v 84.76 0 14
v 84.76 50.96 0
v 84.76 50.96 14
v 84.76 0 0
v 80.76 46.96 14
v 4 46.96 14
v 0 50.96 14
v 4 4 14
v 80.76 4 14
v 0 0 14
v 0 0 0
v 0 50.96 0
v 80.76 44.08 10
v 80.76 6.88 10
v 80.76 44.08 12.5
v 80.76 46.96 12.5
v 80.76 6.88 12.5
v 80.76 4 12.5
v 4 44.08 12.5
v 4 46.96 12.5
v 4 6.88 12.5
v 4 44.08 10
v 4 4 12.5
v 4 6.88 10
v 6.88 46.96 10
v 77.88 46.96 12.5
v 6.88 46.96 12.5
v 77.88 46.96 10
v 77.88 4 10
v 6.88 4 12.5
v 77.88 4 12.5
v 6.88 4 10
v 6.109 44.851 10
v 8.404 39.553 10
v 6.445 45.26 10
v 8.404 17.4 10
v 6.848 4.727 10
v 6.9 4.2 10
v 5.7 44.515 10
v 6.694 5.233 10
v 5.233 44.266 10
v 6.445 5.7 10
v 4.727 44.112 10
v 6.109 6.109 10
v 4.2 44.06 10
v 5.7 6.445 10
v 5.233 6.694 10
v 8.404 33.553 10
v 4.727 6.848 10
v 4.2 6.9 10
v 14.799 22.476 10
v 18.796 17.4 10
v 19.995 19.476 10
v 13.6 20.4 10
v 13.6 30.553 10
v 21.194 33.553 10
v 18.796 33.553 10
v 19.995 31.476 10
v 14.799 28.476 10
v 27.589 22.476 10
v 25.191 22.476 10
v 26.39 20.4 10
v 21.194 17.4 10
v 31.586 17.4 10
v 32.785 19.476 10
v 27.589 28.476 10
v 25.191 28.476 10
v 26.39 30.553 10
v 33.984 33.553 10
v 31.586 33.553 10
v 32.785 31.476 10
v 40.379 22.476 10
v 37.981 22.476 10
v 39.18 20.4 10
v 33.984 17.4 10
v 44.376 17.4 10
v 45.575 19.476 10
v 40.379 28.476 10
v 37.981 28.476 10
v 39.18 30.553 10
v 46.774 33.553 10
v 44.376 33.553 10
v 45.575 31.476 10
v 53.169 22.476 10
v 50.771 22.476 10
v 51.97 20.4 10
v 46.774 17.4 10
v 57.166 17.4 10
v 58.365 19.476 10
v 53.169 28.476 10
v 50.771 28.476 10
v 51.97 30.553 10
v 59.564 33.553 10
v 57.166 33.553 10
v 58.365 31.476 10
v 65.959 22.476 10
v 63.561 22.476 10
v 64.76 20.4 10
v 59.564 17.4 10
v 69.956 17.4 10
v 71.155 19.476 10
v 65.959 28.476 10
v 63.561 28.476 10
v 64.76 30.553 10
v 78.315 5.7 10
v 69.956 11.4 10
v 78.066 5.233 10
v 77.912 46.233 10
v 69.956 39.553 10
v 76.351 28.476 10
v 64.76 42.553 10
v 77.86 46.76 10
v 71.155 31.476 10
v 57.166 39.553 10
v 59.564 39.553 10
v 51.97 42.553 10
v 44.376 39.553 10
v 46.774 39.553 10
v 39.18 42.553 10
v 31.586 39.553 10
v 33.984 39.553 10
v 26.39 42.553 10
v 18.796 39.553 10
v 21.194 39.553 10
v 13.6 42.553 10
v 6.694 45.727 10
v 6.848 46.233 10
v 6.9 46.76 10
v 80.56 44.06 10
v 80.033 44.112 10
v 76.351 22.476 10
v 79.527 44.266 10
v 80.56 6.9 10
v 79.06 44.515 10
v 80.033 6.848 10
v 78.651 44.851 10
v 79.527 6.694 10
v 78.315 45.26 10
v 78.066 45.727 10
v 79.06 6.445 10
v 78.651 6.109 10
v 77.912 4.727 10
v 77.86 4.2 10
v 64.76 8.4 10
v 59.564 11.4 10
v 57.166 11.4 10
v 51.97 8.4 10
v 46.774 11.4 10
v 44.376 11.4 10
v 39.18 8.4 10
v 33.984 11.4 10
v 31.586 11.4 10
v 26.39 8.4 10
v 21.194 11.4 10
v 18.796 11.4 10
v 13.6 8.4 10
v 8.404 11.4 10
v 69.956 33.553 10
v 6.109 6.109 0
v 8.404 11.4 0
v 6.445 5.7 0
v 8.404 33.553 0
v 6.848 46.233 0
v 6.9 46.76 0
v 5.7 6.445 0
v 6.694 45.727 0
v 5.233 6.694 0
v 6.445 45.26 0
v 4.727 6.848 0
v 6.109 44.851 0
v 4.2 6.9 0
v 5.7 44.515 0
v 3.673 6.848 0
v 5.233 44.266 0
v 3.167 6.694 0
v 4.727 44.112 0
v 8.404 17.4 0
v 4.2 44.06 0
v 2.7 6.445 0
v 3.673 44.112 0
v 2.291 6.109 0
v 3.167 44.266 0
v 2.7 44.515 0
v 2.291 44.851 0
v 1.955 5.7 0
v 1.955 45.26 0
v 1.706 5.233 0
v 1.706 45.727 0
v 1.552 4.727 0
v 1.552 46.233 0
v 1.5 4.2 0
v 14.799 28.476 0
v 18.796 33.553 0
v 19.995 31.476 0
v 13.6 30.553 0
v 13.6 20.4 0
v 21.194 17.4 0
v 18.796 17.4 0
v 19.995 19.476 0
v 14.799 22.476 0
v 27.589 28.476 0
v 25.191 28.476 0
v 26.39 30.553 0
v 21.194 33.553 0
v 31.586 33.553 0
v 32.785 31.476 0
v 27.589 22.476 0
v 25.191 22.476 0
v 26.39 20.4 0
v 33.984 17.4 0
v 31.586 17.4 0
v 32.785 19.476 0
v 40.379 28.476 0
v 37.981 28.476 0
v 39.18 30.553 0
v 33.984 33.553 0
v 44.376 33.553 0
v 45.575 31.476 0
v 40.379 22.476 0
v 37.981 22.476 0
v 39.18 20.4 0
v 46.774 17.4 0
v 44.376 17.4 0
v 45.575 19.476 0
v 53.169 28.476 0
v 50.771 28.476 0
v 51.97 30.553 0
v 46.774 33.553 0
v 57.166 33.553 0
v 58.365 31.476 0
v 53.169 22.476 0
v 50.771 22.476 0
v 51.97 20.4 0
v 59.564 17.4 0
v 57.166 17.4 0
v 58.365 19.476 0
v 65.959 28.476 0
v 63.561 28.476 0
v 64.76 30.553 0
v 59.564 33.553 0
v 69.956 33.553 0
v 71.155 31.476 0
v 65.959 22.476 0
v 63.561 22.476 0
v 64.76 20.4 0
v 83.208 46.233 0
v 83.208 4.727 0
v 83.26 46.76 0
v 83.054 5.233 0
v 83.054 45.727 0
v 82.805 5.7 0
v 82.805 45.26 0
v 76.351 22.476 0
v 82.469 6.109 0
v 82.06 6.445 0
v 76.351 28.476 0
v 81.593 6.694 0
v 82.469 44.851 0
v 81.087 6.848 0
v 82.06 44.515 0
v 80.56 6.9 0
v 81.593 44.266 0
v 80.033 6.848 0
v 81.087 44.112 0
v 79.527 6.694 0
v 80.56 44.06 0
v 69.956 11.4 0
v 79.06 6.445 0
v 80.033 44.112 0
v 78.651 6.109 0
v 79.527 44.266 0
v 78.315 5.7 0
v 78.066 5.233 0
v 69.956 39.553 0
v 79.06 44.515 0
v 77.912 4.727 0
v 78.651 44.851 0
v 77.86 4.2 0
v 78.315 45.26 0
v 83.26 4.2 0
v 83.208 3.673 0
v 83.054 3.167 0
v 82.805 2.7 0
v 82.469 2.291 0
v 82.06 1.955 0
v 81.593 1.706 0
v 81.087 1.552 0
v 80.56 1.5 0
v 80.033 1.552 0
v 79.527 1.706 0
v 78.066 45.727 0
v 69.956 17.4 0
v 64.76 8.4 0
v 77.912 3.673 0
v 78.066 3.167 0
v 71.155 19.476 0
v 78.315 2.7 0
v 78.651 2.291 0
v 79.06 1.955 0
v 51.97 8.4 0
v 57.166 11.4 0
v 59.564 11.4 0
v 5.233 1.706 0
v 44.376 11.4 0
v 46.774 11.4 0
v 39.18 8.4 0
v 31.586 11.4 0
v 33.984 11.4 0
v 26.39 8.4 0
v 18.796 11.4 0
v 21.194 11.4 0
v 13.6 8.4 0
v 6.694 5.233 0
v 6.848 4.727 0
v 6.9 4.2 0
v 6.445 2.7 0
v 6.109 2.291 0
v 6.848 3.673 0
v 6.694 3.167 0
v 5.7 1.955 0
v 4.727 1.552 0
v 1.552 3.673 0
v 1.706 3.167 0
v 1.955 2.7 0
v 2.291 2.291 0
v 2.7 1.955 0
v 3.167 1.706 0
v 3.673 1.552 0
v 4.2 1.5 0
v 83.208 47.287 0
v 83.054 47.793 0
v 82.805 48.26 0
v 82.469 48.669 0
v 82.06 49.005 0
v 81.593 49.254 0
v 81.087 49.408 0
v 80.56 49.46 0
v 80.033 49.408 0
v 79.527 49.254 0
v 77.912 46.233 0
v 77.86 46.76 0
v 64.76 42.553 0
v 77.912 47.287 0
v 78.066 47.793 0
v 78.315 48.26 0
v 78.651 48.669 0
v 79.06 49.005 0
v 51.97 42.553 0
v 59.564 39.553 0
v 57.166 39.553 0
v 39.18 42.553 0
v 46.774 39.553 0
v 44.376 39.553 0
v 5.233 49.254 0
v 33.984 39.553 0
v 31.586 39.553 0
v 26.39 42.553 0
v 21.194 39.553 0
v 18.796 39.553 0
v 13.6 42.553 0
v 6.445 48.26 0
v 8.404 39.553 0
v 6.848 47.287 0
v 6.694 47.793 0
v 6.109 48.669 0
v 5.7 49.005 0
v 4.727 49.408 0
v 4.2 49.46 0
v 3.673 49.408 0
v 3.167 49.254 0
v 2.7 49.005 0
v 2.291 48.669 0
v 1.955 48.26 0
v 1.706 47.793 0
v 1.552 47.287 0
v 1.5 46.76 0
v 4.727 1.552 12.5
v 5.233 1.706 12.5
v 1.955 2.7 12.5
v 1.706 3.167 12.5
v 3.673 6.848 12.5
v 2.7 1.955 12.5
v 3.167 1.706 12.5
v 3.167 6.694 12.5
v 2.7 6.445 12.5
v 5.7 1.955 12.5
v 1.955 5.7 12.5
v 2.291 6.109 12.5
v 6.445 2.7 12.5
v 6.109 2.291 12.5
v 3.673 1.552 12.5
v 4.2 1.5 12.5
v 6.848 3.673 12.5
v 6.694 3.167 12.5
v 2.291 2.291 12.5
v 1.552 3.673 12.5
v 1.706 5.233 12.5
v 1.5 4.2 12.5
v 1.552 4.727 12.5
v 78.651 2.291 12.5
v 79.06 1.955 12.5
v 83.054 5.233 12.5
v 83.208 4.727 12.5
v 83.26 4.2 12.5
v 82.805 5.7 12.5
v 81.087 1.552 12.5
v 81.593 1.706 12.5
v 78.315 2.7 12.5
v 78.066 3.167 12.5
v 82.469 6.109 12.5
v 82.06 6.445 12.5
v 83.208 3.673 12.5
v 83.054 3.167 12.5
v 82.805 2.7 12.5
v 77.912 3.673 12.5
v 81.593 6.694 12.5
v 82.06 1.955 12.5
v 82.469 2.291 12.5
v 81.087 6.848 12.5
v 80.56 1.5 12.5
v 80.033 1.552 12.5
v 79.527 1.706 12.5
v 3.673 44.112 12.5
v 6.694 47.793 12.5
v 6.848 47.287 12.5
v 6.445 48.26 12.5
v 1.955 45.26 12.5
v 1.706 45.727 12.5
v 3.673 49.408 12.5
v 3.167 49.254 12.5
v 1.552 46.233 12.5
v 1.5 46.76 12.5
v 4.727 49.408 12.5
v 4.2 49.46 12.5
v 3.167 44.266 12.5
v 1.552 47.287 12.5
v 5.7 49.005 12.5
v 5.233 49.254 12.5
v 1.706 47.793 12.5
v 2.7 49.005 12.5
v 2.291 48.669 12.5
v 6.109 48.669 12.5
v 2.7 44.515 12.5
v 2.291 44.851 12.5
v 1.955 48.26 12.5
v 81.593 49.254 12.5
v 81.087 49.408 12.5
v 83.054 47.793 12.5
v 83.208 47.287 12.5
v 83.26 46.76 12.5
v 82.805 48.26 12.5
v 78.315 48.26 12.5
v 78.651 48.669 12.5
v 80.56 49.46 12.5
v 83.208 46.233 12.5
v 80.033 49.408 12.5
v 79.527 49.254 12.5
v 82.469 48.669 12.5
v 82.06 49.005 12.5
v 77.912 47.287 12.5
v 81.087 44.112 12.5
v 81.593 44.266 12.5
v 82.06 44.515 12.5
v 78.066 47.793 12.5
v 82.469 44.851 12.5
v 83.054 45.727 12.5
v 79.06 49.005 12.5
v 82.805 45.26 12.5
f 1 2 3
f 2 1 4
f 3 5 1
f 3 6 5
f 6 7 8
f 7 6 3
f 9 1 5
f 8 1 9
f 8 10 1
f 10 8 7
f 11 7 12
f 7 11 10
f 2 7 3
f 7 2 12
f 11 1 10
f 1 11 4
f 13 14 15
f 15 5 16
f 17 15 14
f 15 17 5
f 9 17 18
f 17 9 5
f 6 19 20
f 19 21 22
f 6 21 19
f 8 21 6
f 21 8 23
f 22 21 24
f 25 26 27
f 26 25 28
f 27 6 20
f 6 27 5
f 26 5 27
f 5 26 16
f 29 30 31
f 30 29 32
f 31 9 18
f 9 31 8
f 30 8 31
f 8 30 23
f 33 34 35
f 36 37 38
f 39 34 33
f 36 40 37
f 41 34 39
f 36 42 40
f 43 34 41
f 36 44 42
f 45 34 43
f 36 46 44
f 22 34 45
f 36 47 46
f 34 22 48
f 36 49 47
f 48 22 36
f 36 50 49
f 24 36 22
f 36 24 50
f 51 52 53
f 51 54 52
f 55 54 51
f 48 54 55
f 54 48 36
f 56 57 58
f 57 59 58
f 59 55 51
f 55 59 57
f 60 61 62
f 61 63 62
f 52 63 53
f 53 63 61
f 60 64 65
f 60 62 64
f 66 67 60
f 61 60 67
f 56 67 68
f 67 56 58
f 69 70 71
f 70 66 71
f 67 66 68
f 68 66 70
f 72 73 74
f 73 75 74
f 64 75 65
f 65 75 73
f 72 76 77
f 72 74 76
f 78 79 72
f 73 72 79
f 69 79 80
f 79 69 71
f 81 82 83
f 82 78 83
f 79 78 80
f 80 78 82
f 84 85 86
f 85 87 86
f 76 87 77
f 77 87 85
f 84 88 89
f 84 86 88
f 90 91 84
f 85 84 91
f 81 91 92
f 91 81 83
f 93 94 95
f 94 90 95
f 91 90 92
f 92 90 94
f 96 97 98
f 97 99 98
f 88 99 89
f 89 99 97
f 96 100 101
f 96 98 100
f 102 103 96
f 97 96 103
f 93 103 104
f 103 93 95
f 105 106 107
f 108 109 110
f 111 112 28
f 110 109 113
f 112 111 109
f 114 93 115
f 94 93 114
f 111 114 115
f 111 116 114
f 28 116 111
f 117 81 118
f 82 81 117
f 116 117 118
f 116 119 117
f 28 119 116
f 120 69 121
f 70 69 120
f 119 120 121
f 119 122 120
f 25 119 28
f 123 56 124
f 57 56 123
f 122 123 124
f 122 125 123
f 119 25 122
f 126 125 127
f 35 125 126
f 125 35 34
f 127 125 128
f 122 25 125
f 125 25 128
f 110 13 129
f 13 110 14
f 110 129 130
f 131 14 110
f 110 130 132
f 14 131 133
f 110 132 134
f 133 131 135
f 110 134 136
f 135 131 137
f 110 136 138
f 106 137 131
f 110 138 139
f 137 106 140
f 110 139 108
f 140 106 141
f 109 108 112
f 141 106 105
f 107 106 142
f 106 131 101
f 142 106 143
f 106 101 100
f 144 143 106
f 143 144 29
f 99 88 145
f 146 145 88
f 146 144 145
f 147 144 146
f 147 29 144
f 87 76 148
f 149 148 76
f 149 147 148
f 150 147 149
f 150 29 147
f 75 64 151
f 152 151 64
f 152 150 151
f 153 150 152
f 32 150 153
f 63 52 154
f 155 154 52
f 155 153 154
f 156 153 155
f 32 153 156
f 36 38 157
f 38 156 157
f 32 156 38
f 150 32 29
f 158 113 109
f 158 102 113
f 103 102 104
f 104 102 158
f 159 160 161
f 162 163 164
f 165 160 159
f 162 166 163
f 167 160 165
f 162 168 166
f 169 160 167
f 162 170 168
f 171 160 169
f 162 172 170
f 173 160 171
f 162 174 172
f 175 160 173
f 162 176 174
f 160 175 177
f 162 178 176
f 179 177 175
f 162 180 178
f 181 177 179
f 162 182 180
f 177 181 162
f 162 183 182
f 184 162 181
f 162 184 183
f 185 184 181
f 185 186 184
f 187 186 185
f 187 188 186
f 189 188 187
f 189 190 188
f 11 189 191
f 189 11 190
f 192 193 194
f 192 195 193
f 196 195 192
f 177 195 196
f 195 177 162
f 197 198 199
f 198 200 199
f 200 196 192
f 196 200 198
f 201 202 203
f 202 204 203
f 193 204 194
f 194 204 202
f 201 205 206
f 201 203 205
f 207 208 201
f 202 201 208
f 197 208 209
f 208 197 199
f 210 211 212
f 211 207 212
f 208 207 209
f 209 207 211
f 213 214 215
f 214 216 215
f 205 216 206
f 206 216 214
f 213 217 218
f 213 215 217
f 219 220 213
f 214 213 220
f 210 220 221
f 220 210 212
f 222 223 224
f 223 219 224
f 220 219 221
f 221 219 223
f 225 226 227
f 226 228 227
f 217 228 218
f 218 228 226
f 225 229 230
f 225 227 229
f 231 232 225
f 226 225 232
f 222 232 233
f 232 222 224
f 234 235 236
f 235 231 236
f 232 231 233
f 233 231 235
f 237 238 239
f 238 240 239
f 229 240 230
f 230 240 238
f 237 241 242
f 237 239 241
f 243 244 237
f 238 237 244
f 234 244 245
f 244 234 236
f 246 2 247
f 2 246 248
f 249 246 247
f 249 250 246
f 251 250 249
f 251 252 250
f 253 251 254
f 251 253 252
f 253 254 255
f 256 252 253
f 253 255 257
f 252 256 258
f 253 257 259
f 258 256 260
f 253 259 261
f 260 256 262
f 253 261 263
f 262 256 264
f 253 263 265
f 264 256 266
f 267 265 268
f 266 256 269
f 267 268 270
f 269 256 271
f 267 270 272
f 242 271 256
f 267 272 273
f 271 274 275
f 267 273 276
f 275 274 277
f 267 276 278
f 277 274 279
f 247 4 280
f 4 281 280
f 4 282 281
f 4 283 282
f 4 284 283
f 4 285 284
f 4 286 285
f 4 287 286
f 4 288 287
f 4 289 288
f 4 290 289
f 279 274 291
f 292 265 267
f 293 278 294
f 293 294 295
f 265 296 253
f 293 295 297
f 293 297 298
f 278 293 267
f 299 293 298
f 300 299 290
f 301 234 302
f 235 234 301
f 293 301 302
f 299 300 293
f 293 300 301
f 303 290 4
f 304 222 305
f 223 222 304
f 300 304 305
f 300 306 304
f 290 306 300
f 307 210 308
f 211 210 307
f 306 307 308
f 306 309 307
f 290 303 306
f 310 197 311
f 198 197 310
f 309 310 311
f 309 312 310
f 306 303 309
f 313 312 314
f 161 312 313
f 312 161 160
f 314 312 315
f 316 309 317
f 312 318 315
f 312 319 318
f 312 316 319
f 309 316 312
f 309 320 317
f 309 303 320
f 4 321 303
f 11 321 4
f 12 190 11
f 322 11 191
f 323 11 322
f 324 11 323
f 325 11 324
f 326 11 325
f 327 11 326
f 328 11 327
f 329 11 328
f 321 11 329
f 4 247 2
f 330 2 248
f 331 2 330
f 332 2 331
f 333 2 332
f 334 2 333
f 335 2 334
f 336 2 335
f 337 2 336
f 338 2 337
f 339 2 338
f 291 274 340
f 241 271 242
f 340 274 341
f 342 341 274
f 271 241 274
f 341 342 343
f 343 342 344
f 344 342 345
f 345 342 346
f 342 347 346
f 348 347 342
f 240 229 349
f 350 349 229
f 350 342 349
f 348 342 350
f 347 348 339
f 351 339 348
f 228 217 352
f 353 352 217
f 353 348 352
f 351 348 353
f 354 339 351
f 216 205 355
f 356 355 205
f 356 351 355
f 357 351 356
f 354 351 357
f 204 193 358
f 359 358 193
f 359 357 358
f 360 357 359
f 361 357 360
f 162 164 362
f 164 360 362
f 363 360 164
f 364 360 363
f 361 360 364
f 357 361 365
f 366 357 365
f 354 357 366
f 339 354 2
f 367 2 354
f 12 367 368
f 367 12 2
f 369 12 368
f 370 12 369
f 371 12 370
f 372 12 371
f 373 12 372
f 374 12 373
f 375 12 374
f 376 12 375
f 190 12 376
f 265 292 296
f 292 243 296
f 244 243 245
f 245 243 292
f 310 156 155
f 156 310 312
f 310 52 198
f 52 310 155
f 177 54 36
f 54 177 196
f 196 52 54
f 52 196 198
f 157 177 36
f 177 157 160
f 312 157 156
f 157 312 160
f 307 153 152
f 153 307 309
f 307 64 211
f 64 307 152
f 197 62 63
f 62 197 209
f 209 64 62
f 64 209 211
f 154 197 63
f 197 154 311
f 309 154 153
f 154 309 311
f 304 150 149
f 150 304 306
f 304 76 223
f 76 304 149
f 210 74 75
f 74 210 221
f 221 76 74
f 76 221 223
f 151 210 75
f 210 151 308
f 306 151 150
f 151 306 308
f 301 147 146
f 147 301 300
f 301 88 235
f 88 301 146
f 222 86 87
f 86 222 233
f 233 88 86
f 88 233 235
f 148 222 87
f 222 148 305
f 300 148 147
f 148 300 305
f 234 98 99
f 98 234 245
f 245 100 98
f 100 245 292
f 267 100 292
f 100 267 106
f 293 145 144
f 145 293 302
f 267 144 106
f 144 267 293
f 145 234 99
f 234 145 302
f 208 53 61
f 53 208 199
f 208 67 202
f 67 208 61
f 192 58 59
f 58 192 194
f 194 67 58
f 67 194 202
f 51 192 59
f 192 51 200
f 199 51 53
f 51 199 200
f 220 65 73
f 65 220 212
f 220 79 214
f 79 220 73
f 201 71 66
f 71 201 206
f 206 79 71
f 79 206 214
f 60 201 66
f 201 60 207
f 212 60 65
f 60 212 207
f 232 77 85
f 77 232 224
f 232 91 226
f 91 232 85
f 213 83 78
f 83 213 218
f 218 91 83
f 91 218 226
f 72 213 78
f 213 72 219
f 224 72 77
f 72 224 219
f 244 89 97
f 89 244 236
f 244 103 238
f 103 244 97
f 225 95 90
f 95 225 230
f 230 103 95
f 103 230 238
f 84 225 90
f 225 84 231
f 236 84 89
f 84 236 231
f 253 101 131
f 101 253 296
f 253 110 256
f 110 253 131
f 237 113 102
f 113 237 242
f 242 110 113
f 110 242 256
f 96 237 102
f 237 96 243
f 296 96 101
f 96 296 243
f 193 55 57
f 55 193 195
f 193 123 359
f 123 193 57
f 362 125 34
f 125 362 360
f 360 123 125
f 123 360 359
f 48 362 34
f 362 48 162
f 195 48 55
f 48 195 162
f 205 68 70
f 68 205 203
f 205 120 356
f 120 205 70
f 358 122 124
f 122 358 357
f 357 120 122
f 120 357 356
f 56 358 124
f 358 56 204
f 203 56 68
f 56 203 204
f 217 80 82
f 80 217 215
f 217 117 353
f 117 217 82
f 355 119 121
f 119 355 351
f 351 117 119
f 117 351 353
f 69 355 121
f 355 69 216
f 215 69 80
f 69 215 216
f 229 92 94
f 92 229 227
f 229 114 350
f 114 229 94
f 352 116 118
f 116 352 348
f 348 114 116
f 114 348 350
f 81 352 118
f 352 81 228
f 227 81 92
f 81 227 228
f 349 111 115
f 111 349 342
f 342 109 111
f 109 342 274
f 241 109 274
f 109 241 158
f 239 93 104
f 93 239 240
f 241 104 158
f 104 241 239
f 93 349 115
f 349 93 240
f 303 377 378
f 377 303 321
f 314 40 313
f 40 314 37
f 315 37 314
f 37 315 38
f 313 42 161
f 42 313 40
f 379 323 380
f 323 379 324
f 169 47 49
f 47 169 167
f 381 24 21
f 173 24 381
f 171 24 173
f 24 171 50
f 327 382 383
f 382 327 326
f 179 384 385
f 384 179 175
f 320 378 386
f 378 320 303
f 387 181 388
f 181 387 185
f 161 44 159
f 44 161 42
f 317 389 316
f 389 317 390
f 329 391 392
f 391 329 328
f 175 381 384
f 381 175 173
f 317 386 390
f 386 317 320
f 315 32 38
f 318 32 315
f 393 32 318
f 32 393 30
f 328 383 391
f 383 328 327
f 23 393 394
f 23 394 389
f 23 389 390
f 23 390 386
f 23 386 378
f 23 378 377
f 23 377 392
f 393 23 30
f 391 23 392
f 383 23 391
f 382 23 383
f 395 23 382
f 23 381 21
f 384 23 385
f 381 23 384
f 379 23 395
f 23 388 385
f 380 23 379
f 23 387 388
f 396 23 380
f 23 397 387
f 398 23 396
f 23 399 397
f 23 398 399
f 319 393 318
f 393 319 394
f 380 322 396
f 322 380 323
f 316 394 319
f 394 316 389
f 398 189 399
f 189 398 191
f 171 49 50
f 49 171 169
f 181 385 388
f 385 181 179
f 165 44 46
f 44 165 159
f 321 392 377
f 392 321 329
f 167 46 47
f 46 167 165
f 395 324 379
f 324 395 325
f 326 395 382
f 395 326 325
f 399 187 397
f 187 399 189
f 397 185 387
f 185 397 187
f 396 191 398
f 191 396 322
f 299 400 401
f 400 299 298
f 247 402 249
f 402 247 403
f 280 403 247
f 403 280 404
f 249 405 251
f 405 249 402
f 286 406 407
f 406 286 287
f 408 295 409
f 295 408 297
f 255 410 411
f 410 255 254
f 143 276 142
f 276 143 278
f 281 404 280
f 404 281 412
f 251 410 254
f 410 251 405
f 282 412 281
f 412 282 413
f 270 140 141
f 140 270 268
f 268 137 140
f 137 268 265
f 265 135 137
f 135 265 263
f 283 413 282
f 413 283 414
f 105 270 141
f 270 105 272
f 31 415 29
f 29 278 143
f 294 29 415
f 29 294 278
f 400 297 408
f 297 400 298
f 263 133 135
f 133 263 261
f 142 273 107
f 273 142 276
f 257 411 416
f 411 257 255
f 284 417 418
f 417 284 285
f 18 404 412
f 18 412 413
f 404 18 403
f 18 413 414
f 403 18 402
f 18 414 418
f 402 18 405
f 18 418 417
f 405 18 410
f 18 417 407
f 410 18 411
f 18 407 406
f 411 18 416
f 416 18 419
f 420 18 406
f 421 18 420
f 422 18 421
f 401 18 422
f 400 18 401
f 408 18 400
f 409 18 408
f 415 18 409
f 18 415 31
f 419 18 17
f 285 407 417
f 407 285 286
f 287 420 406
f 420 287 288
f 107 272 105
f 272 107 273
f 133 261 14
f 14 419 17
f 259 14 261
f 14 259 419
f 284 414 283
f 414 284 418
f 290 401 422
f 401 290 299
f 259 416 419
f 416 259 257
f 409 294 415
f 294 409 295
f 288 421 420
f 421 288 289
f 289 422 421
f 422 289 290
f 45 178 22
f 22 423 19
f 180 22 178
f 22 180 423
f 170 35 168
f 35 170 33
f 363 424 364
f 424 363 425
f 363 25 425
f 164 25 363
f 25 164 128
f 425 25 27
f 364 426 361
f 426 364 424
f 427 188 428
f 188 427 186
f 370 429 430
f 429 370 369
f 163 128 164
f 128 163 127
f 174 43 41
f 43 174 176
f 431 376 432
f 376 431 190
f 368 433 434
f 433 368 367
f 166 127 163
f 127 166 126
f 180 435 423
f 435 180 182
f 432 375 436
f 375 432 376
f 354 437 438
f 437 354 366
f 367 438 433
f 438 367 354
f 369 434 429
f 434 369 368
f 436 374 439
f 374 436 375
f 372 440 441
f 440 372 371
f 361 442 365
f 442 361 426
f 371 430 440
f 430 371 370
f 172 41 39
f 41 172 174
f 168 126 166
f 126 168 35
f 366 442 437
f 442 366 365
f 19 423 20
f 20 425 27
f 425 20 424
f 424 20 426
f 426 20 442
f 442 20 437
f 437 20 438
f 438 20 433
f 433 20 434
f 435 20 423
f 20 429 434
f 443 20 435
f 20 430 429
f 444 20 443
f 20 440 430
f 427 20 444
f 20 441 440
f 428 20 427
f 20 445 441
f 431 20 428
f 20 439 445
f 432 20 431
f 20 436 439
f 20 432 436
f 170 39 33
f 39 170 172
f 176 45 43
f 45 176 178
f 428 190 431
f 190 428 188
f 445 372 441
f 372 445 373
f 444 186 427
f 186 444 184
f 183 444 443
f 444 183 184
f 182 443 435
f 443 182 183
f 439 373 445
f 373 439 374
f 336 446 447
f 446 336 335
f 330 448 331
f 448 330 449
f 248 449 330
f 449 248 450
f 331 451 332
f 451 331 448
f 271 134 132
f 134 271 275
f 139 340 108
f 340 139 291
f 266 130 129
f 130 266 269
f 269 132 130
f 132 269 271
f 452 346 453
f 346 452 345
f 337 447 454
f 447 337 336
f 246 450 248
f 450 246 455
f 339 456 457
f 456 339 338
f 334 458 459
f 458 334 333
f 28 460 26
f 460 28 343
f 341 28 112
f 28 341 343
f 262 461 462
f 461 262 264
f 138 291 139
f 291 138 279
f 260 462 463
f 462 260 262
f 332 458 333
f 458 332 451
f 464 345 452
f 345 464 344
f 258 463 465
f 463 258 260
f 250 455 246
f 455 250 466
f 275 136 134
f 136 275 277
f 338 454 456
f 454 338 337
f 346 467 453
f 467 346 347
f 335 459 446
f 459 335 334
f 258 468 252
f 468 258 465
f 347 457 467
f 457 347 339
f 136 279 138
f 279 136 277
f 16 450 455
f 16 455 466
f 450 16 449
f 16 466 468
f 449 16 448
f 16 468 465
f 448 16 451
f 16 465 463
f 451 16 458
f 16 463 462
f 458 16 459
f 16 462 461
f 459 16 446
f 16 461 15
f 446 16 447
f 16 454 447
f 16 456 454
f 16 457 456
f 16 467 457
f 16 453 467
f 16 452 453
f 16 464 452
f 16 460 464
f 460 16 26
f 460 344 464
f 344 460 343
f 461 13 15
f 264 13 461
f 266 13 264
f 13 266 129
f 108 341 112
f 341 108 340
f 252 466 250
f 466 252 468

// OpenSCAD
$fn = 32;

// ----------------------------------------------------------------------
// Honeycomb panel: 84.76 x 50.96 mm, 15 cells of 12 mm
// ----------------------------------------------------------------------

// --- parameters (mm) ---
panel_w = 84.76;          // panel width
panel_d = 50.96;          // panel depth
thick = 10;               // panel thickness
cell_r = 6;               // hex cell circumradius
pitch = 12.79;            // hex cell pitch (centre to centre)
web = 2.4;                // web between the cells
columns = 5;              // columns of cells
rows = 3;                 // rows of cells
cell_count = 15;          // total cells
shift_x = 13.6;           // first cell offset in x
shift_y = 14.4;           // first cell offset in y
mount_d = 5.4;            // corner mounting holes
hole_off = 4.2;           // mounting hole offset from the corners
rim_h = 14;               // rim height
rim_t = 4;                // rim wall thickness

difference() {
  union() {
    cube([panel_w, panel_d, thick]);
    /* rim around the panel, sunk 1 mm into the plate */
    translate([0, 0, thick - 1]) difference() {
      cube([panel_w, panel_d, rim_h - thick + 1]);
      translate([rim_t, rim_t, -2.5]) cube([panel_w - 2 * rim_t, panel_d - 2 * rim_t, rim_h - thick + 6]);
    }
  }
  /* hexagonal cells, point-up, cut right through the plate */
  for (row = [0 : rows - 1]) {
    for (col = [0 : columns - 1]) {
      translate([shift_x + col * pitch + (row % 2) * pitch / 2, shift_y + row * pitch * 0.866025, -2.5]) rotate([0, 0, 30]) cylinder(h = thick + 5, d = 2 * cell_r, $fn = 6);
    }
  }
  /* corner mounting holes, clear of the outer cell web */
  translate([4.2, 4.2, -2.5]) cylinder(h = thick + 5, d = mount_d);
  translate([80.56, 4.2, -2.5]) cylinder(h = thick + 5, d = mount_d);
  translate([4.2, 46.76, -2.5]) cylinder(h = thick + 5, d = mount_d);
  translate([80.56, 46.76, -2.5]) cylinder(h = thick + 5, d = mount_d);
}
